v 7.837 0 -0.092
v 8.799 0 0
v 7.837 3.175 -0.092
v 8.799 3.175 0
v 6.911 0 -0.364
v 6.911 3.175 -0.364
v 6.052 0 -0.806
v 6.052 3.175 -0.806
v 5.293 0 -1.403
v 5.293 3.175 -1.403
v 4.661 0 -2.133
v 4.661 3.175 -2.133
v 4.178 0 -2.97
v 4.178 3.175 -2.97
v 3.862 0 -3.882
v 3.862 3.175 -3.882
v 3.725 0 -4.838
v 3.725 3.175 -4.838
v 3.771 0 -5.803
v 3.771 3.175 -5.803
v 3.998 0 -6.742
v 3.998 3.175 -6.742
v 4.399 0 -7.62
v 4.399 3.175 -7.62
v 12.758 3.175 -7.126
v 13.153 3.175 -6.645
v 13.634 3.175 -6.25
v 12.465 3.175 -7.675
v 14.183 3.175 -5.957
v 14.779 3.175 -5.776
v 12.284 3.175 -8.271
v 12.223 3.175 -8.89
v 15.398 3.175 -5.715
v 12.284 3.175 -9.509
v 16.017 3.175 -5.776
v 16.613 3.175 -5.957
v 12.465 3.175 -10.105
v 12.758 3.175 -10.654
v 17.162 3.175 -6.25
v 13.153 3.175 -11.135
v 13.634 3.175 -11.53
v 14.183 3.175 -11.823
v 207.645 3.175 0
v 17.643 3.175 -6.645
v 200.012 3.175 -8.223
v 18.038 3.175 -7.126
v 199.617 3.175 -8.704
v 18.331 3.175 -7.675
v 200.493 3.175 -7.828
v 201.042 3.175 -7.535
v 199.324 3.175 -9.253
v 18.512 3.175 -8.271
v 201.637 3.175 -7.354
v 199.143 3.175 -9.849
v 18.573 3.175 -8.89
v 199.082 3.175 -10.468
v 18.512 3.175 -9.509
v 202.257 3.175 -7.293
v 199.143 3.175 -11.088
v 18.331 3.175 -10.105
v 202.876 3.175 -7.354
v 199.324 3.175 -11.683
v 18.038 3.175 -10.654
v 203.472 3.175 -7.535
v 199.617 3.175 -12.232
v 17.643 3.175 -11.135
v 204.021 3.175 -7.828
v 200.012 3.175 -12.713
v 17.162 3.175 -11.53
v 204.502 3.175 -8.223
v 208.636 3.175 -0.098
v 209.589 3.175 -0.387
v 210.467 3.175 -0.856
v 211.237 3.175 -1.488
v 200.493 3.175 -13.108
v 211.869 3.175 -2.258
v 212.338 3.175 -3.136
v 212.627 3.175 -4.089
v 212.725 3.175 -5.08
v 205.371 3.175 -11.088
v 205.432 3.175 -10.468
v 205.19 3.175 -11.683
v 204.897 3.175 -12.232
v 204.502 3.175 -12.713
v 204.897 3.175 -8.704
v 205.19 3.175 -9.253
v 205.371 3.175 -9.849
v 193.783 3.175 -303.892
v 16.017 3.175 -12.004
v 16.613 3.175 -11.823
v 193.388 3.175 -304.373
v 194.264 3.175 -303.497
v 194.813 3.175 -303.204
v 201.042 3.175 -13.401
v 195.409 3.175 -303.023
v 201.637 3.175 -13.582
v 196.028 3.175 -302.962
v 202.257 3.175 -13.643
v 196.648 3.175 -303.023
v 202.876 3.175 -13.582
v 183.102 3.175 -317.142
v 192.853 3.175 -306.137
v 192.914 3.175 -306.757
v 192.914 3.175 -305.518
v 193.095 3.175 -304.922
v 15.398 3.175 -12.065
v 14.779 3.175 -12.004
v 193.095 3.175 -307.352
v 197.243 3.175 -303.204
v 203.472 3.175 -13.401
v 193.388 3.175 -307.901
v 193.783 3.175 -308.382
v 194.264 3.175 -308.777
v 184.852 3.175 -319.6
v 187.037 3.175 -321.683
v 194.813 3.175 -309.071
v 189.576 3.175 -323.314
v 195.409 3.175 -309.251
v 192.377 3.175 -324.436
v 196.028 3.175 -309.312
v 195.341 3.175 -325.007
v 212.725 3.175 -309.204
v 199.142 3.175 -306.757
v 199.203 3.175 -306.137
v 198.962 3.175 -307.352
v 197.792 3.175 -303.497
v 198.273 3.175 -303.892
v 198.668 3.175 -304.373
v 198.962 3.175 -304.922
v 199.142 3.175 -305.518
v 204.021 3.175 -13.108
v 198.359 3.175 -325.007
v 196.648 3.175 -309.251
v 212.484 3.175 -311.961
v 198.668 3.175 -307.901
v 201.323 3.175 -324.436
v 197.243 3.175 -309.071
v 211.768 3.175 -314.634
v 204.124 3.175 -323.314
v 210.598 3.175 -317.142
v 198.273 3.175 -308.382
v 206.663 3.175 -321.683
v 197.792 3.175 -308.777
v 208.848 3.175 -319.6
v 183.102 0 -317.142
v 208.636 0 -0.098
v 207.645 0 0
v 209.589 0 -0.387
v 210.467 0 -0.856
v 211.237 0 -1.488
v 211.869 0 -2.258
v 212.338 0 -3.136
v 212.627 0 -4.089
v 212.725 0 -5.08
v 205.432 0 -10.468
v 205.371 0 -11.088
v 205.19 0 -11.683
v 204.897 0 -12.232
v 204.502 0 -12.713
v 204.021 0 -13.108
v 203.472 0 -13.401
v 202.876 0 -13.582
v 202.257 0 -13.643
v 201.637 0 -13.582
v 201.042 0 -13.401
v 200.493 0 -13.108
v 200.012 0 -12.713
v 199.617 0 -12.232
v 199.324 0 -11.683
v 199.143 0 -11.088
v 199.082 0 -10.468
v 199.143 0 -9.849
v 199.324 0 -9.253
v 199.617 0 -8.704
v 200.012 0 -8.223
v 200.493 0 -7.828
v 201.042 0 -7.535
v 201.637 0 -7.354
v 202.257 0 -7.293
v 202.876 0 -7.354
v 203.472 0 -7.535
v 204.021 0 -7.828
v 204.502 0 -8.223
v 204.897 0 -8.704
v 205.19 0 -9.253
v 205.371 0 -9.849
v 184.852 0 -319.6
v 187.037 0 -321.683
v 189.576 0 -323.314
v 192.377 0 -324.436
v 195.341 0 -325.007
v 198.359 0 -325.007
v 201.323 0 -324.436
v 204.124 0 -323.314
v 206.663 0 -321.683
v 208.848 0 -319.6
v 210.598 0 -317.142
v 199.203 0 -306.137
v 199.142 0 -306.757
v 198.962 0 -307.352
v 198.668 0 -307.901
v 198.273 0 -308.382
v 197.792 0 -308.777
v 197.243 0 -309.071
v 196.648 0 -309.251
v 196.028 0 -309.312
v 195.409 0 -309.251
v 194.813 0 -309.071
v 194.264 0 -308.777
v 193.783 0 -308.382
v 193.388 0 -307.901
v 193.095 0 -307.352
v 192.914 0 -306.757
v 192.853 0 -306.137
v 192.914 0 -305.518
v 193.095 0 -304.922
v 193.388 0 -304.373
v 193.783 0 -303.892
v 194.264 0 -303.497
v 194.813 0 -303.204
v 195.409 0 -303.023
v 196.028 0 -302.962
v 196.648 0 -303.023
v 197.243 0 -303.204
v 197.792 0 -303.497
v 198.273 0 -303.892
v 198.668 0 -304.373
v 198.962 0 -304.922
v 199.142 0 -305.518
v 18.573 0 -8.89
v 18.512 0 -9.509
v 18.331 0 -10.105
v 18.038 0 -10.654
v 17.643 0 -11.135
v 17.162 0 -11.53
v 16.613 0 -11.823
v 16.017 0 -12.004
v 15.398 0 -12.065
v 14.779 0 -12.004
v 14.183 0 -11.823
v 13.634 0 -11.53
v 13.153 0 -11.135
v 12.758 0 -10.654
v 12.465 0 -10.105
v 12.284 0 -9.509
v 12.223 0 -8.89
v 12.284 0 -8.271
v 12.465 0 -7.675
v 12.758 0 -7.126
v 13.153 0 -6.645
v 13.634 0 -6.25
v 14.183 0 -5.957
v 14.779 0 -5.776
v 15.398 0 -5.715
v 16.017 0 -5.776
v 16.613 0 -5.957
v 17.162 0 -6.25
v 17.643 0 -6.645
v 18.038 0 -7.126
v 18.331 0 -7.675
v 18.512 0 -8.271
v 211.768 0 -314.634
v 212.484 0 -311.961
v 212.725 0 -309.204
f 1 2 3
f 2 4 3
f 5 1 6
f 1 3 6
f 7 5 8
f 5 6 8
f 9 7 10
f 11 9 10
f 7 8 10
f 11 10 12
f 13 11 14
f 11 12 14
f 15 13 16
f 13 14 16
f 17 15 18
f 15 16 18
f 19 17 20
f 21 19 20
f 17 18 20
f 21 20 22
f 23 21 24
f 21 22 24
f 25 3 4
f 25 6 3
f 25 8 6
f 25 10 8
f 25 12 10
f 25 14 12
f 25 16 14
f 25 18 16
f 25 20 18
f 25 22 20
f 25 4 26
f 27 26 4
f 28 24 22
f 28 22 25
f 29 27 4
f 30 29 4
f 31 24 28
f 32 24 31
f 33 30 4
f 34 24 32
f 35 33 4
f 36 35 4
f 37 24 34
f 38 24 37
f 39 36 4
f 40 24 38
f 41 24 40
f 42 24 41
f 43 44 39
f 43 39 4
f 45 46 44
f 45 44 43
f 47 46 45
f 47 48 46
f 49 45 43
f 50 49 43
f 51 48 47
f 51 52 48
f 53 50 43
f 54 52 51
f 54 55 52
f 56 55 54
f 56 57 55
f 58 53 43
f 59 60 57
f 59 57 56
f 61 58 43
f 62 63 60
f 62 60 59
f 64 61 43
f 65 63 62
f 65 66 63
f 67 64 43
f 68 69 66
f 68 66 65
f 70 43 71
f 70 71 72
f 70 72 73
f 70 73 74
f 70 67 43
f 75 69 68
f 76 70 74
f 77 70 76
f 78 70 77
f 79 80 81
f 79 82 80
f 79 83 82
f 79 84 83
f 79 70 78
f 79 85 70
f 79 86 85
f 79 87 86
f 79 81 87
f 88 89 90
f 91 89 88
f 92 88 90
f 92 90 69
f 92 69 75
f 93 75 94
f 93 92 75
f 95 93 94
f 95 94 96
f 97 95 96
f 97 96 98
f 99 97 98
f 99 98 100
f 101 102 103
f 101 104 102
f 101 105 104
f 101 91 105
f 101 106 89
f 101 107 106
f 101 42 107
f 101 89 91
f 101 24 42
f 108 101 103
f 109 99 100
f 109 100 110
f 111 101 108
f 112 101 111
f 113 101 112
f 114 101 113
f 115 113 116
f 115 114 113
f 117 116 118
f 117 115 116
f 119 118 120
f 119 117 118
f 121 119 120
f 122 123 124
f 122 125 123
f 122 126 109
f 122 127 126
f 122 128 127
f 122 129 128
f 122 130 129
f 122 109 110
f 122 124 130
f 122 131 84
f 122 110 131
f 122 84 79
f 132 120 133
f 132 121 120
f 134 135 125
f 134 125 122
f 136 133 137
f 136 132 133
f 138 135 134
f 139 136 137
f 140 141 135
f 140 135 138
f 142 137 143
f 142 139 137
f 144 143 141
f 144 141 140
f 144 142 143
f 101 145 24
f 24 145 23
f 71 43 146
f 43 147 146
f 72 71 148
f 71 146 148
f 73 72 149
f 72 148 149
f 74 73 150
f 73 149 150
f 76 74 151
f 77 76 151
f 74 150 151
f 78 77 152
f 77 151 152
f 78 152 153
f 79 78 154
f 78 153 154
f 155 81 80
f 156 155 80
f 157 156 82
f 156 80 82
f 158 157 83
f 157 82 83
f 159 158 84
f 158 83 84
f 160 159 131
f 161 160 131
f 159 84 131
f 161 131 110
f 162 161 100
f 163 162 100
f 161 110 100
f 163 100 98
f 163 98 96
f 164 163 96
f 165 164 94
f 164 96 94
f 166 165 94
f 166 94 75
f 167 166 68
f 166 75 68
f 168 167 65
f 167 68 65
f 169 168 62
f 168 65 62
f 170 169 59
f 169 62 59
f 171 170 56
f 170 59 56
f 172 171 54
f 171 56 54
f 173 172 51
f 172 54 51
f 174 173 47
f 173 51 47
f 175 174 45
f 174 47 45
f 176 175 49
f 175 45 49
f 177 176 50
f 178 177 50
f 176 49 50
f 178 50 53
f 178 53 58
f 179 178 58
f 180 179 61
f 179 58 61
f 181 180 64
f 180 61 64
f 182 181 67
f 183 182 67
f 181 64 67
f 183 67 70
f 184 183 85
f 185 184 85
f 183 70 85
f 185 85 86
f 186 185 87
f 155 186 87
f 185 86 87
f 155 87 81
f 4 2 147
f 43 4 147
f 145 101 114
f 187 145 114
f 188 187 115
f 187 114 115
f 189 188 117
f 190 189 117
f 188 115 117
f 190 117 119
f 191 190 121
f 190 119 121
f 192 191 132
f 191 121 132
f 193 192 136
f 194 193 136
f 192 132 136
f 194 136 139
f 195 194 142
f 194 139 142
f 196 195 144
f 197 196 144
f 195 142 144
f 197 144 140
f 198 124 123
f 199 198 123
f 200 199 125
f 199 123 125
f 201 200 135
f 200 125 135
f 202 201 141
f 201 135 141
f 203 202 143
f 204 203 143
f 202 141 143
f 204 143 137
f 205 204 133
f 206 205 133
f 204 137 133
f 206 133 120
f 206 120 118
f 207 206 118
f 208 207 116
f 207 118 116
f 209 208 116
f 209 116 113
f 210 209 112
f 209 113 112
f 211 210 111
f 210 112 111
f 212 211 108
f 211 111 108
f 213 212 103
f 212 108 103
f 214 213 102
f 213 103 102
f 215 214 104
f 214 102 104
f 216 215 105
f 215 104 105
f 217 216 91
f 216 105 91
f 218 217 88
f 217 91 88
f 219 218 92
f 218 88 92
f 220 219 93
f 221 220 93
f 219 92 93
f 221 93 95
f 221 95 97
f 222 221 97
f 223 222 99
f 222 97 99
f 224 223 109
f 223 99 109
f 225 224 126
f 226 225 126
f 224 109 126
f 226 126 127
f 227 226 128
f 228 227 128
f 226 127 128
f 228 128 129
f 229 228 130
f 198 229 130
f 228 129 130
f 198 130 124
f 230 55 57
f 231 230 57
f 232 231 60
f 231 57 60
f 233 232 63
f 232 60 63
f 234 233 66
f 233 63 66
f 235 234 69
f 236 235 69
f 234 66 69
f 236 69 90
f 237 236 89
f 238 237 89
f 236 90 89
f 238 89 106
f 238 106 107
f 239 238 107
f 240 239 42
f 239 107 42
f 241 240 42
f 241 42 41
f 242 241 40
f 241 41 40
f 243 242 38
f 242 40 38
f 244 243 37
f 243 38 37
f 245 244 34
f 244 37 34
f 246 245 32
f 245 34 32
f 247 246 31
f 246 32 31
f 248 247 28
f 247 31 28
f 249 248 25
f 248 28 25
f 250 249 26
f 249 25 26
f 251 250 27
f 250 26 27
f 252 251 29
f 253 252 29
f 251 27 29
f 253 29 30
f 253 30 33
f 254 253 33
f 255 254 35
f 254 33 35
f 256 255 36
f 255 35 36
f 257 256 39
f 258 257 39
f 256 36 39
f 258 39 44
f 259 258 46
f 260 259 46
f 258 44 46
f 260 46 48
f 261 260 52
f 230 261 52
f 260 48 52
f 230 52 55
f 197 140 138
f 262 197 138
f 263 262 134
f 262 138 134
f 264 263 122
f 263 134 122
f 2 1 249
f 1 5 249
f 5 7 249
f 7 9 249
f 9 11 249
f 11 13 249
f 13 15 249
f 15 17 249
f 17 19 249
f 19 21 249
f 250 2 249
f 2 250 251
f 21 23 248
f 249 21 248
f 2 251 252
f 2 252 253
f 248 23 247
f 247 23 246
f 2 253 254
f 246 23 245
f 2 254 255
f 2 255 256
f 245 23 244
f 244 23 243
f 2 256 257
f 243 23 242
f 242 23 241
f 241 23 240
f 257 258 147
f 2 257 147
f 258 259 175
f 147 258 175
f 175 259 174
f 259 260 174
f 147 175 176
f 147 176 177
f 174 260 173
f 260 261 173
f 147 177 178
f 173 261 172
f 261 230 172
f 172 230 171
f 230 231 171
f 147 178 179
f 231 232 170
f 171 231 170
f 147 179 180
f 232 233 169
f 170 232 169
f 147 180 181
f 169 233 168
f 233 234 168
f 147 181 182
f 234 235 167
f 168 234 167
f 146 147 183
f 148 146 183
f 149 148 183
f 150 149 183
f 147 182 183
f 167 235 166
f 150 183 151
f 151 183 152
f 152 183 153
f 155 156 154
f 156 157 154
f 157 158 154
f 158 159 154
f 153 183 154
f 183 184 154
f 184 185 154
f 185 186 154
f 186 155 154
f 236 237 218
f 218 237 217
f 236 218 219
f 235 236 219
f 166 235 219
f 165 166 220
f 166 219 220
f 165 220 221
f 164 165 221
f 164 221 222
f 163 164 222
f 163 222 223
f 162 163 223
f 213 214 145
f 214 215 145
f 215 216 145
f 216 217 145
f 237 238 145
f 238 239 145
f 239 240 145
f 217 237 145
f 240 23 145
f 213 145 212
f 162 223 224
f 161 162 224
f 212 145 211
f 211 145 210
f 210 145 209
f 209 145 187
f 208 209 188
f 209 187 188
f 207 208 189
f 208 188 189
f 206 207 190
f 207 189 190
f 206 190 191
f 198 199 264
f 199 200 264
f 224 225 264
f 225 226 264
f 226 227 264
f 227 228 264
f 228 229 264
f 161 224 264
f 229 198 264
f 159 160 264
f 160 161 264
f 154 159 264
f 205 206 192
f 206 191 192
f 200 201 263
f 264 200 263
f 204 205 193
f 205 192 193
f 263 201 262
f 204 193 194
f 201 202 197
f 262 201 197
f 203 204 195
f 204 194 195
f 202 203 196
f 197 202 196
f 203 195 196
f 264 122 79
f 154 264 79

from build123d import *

# Parameters (mm, degrees)
BOSS_EXTRUDE1_DEPTH = 3.175
FILLET1_R           = 5.08
CUT_EXTRUDE2_DEPTH  = 3.175
FILLET2_R           = 5.08
SKETCH4_R           = 3.175
CUT_EXTRUDE3_DEPTH  = 3.175


with BuildPart() as part:
    # Sketch1 → Boss-Extrude1 (new body)
    with BuildSketch(Plane(origin=(0, 0, 0), x_dir=(1, 0, 0), z_dir=(0, 1, 0))):
        Polygon((0, 0), (393.7, 0), (196.85, 340.95420147), align=None)
    extrude(amount=BOSS_EXTRUDE1_DEPTH)

    # Fillet1
    fillet1_edges = [part.edges().sort_by_distance(p)[0] for p in [
        (196.85, 1.5875, -340.95420147),
        (393.7, 1.5875, 0),
        (0, 1.5875, 0),
    ]]
    fillet(fillet1_edges, radius=FILLET1_R)

    # Sketch3 → Cut-Extrude2 (cut)
    with BuildSketch(Plane(origin=(0, 3.175, 0), x_dir=(1, 0, 0), z_dir=(0, 1, 0))):
        with BuildLine():
            Line((389.300590949, 7.62), (210.598153285, 317.14170147))
            ThreePointArc((210.598153285, 317.14170147), (212.184072492, 313.312953811), (212.725, 309.20420147))
            Line((212.725, 309.20420147), (212.725, 0))
            Line((212.725, 0), (384.901181898, 0))
            ThreePointArc((384.901181898, 0), (389.300590949, 2.54), (389.300590949, 7.62))
        make_face()
        with BuildLine():
            Line((210.598153285, 317.14170147), (201.249409051, 333.33420147))
            ThreePointArc((201.249409051, 333.33420147), (196.85, 335.87420147), (192.450590949, 333.33420147))
            Line((192.450590949, 333.33420147), (183.101846715, 317.14170147))
            ThreePointArc((183.101846715, 317.14170147), (196.85, 325.07920147), (210.598153285, 317.14170147))
        make_face()
    extrude(amount=-CUT_EXTRUDE2_DEPTH, mode=Mode.SUBTRACT)

    # Fillet2
    fillet2_edges = [part.edges().sort_by_distance(p)[0] for p in [
        (212.725, 1.5875, 0),
    ]]
    fillet(fillet2_edges, radius=FILLET2_R)

    # Sketch4 → Cut-Extrude3 (cut)
    with BuildSketch(Plane(origin=(0, 3.175, 0), x_dir=(1, 0, 0), z_dir=(0, 1, 0))):
        with Locations((196.028249532, 306.137386971)):
            Circle(SKETCH4_R)
        with Locations((202.256846327, 10.468153673)):
            Circle(SKETCH4_R)
        with Locations((15.397931679, 8.89)):
            Circle(SKETCH4_R)
    extrude(amount=-CUT_EXTRUDE3_DEPTH, mode=Mode.SUBTRACT)


solid = part.part
